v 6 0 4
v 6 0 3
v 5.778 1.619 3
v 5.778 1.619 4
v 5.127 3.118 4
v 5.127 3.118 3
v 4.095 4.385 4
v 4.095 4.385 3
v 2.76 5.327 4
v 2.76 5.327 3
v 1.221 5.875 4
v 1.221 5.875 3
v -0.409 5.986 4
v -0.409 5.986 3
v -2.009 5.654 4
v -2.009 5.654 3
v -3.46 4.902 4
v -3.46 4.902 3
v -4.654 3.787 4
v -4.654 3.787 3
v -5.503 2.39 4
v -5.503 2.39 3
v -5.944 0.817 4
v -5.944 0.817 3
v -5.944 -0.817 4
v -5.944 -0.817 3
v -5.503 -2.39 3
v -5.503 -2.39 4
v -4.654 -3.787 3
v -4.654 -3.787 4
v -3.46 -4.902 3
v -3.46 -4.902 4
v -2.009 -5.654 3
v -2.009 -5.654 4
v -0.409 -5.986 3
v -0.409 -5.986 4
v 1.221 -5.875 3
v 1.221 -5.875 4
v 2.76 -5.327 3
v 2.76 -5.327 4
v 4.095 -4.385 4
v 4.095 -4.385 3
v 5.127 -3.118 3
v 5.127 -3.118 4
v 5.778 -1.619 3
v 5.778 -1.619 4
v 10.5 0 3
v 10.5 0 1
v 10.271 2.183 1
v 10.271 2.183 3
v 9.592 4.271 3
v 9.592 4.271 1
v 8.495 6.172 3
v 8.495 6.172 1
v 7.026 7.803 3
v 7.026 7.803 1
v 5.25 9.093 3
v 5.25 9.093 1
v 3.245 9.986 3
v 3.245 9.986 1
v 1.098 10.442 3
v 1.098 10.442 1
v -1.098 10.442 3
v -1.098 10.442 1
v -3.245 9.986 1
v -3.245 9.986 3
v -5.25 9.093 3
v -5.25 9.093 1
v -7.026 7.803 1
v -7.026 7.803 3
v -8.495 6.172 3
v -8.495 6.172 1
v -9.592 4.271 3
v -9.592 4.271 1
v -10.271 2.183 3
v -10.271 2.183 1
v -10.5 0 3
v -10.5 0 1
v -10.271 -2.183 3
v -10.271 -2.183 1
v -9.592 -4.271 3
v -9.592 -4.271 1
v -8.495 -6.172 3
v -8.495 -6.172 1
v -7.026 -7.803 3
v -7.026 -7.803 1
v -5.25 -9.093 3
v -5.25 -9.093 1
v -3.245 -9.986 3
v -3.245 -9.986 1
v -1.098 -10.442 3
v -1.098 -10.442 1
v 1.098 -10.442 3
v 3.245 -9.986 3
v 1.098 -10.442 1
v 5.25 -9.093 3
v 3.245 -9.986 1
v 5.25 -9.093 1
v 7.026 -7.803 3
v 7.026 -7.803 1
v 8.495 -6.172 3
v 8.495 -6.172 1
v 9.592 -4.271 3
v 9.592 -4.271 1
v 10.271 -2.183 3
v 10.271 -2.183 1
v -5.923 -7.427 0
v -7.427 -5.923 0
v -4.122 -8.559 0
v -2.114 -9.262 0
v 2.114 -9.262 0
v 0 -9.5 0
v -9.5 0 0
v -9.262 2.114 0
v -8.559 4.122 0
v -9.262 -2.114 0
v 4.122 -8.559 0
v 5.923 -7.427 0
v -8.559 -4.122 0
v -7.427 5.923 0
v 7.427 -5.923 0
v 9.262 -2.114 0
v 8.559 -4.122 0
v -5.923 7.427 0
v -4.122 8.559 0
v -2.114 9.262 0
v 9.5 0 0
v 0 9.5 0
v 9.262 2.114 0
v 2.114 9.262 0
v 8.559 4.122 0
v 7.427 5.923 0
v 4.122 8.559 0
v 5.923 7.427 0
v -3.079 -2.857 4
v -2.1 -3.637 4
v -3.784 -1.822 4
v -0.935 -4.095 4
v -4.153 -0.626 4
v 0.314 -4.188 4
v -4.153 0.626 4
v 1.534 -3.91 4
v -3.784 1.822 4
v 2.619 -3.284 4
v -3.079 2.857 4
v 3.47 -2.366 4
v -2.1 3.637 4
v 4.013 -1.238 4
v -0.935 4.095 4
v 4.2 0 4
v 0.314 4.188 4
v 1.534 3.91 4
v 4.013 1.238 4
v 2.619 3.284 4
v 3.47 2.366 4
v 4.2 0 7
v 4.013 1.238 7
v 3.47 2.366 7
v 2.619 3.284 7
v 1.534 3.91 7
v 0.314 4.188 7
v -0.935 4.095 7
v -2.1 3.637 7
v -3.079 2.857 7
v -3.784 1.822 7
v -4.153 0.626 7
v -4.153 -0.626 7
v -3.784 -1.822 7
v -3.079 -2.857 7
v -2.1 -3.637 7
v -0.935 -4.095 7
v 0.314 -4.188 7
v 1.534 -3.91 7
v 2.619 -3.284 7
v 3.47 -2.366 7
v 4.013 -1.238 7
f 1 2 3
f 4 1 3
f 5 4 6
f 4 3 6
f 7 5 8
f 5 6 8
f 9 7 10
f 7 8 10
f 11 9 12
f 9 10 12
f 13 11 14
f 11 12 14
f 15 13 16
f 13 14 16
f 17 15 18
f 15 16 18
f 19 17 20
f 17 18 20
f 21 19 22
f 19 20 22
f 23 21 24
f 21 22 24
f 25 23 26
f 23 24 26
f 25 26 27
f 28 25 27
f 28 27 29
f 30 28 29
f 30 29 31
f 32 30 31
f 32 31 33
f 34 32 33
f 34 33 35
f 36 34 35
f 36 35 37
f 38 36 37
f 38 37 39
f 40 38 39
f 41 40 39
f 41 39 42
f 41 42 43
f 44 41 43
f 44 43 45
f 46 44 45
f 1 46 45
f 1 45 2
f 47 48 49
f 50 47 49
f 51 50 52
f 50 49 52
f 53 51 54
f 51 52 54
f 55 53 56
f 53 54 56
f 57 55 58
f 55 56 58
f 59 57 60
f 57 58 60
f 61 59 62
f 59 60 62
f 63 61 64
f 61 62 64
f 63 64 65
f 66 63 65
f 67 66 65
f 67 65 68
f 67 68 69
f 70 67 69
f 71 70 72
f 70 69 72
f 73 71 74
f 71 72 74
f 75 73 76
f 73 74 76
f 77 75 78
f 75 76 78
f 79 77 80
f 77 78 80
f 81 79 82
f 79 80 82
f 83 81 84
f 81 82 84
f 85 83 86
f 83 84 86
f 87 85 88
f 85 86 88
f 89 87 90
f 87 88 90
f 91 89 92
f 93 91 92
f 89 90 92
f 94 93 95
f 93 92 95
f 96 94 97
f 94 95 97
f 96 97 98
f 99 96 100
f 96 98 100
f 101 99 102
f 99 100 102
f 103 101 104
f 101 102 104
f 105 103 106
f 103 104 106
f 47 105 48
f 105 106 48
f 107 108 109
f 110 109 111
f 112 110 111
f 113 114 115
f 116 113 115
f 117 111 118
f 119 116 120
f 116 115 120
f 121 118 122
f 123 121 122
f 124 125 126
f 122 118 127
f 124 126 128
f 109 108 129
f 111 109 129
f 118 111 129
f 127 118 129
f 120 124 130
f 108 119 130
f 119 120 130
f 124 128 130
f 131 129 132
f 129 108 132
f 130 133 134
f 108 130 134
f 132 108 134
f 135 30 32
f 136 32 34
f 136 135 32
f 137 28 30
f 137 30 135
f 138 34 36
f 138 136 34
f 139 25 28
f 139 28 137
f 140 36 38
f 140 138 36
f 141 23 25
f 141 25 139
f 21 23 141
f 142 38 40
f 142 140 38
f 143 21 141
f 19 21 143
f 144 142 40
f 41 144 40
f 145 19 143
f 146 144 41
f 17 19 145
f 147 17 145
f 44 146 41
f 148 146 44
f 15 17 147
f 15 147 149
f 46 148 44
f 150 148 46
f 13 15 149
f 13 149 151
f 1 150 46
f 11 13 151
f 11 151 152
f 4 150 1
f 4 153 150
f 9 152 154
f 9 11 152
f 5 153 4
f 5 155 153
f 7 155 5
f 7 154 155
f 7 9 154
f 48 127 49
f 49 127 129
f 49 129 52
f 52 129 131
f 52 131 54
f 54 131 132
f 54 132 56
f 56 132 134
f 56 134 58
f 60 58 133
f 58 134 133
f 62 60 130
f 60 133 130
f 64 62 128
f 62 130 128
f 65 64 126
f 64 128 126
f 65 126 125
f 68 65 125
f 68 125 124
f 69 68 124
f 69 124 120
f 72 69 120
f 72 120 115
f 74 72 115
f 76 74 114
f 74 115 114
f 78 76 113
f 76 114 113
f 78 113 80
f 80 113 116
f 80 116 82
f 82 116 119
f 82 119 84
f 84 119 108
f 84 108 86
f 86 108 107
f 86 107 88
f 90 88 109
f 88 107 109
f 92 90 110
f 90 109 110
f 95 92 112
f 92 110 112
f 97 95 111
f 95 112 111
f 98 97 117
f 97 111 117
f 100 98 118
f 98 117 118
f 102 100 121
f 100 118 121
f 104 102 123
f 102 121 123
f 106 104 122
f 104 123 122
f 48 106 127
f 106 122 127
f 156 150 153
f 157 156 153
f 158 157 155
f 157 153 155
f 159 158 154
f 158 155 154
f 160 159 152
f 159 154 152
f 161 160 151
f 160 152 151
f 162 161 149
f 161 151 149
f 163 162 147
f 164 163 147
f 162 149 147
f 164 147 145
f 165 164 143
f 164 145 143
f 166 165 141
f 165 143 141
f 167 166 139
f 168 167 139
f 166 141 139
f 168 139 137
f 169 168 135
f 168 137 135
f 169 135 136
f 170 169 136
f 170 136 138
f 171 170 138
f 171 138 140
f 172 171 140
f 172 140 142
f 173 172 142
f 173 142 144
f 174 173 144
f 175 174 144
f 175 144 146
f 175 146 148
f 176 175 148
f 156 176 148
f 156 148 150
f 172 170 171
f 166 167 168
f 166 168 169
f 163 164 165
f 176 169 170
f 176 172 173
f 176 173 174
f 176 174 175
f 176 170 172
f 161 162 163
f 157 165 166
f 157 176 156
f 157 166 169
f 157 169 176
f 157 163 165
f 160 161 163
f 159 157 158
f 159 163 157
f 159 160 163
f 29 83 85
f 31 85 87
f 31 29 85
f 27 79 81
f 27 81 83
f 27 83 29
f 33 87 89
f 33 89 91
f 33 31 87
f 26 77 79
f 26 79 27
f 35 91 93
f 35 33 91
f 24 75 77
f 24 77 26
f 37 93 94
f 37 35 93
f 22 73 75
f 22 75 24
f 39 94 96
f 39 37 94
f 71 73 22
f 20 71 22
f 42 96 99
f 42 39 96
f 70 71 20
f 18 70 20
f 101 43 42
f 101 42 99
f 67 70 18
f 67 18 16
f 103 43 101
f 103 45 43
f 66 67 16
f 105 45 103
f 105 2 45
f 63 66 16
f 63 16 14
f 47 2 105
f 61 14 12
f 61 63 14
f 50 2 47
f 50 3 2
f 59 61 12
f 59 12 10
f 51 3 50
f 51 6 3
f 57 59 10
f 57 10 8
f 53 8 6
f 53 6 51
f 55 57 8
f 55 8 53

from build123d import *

# Parameters (mm, degrees)
F2_R     = 10.5
F2_R_2   = 6
F3_DEPTH = 3
F2_R_3   = 4.2
F4_DEPTH = 4
F5_DEPTH = 7
F6_SIZE  = 1


with BuildPart() as f3:
    # F2 (on Top) → F3 (new body)
    with BuildSketch(Plane.XY):
        Circle(F2_R)
        Circle(F2_R_2, mode=Mode.SUBTRACT)
    extrude(amount=F3_DEPTH)

    # F2 (on Top) → F4 (join)
    with BuildSketch(Plane.XY):
        Circle(F2_R_2)
        Circle(F2_R_3, mode=Mode.SUBTRACT)
    extrude(amount=F4_DEPTH)

    # F2 (on Top) → F5 (join)
    with BuildSketch(Plane.XY):
        Circle(F2_R_3)
    extrude(amount=F5_DEPTH)

    # F6
    f6_edges = [f3.edges().sort_by_distance(p)[0] for p in [
        (-10.5, 0, 0),
    ]]
    chamfer(f6_edges, length=F6_SIZE)


solid = f3.part
